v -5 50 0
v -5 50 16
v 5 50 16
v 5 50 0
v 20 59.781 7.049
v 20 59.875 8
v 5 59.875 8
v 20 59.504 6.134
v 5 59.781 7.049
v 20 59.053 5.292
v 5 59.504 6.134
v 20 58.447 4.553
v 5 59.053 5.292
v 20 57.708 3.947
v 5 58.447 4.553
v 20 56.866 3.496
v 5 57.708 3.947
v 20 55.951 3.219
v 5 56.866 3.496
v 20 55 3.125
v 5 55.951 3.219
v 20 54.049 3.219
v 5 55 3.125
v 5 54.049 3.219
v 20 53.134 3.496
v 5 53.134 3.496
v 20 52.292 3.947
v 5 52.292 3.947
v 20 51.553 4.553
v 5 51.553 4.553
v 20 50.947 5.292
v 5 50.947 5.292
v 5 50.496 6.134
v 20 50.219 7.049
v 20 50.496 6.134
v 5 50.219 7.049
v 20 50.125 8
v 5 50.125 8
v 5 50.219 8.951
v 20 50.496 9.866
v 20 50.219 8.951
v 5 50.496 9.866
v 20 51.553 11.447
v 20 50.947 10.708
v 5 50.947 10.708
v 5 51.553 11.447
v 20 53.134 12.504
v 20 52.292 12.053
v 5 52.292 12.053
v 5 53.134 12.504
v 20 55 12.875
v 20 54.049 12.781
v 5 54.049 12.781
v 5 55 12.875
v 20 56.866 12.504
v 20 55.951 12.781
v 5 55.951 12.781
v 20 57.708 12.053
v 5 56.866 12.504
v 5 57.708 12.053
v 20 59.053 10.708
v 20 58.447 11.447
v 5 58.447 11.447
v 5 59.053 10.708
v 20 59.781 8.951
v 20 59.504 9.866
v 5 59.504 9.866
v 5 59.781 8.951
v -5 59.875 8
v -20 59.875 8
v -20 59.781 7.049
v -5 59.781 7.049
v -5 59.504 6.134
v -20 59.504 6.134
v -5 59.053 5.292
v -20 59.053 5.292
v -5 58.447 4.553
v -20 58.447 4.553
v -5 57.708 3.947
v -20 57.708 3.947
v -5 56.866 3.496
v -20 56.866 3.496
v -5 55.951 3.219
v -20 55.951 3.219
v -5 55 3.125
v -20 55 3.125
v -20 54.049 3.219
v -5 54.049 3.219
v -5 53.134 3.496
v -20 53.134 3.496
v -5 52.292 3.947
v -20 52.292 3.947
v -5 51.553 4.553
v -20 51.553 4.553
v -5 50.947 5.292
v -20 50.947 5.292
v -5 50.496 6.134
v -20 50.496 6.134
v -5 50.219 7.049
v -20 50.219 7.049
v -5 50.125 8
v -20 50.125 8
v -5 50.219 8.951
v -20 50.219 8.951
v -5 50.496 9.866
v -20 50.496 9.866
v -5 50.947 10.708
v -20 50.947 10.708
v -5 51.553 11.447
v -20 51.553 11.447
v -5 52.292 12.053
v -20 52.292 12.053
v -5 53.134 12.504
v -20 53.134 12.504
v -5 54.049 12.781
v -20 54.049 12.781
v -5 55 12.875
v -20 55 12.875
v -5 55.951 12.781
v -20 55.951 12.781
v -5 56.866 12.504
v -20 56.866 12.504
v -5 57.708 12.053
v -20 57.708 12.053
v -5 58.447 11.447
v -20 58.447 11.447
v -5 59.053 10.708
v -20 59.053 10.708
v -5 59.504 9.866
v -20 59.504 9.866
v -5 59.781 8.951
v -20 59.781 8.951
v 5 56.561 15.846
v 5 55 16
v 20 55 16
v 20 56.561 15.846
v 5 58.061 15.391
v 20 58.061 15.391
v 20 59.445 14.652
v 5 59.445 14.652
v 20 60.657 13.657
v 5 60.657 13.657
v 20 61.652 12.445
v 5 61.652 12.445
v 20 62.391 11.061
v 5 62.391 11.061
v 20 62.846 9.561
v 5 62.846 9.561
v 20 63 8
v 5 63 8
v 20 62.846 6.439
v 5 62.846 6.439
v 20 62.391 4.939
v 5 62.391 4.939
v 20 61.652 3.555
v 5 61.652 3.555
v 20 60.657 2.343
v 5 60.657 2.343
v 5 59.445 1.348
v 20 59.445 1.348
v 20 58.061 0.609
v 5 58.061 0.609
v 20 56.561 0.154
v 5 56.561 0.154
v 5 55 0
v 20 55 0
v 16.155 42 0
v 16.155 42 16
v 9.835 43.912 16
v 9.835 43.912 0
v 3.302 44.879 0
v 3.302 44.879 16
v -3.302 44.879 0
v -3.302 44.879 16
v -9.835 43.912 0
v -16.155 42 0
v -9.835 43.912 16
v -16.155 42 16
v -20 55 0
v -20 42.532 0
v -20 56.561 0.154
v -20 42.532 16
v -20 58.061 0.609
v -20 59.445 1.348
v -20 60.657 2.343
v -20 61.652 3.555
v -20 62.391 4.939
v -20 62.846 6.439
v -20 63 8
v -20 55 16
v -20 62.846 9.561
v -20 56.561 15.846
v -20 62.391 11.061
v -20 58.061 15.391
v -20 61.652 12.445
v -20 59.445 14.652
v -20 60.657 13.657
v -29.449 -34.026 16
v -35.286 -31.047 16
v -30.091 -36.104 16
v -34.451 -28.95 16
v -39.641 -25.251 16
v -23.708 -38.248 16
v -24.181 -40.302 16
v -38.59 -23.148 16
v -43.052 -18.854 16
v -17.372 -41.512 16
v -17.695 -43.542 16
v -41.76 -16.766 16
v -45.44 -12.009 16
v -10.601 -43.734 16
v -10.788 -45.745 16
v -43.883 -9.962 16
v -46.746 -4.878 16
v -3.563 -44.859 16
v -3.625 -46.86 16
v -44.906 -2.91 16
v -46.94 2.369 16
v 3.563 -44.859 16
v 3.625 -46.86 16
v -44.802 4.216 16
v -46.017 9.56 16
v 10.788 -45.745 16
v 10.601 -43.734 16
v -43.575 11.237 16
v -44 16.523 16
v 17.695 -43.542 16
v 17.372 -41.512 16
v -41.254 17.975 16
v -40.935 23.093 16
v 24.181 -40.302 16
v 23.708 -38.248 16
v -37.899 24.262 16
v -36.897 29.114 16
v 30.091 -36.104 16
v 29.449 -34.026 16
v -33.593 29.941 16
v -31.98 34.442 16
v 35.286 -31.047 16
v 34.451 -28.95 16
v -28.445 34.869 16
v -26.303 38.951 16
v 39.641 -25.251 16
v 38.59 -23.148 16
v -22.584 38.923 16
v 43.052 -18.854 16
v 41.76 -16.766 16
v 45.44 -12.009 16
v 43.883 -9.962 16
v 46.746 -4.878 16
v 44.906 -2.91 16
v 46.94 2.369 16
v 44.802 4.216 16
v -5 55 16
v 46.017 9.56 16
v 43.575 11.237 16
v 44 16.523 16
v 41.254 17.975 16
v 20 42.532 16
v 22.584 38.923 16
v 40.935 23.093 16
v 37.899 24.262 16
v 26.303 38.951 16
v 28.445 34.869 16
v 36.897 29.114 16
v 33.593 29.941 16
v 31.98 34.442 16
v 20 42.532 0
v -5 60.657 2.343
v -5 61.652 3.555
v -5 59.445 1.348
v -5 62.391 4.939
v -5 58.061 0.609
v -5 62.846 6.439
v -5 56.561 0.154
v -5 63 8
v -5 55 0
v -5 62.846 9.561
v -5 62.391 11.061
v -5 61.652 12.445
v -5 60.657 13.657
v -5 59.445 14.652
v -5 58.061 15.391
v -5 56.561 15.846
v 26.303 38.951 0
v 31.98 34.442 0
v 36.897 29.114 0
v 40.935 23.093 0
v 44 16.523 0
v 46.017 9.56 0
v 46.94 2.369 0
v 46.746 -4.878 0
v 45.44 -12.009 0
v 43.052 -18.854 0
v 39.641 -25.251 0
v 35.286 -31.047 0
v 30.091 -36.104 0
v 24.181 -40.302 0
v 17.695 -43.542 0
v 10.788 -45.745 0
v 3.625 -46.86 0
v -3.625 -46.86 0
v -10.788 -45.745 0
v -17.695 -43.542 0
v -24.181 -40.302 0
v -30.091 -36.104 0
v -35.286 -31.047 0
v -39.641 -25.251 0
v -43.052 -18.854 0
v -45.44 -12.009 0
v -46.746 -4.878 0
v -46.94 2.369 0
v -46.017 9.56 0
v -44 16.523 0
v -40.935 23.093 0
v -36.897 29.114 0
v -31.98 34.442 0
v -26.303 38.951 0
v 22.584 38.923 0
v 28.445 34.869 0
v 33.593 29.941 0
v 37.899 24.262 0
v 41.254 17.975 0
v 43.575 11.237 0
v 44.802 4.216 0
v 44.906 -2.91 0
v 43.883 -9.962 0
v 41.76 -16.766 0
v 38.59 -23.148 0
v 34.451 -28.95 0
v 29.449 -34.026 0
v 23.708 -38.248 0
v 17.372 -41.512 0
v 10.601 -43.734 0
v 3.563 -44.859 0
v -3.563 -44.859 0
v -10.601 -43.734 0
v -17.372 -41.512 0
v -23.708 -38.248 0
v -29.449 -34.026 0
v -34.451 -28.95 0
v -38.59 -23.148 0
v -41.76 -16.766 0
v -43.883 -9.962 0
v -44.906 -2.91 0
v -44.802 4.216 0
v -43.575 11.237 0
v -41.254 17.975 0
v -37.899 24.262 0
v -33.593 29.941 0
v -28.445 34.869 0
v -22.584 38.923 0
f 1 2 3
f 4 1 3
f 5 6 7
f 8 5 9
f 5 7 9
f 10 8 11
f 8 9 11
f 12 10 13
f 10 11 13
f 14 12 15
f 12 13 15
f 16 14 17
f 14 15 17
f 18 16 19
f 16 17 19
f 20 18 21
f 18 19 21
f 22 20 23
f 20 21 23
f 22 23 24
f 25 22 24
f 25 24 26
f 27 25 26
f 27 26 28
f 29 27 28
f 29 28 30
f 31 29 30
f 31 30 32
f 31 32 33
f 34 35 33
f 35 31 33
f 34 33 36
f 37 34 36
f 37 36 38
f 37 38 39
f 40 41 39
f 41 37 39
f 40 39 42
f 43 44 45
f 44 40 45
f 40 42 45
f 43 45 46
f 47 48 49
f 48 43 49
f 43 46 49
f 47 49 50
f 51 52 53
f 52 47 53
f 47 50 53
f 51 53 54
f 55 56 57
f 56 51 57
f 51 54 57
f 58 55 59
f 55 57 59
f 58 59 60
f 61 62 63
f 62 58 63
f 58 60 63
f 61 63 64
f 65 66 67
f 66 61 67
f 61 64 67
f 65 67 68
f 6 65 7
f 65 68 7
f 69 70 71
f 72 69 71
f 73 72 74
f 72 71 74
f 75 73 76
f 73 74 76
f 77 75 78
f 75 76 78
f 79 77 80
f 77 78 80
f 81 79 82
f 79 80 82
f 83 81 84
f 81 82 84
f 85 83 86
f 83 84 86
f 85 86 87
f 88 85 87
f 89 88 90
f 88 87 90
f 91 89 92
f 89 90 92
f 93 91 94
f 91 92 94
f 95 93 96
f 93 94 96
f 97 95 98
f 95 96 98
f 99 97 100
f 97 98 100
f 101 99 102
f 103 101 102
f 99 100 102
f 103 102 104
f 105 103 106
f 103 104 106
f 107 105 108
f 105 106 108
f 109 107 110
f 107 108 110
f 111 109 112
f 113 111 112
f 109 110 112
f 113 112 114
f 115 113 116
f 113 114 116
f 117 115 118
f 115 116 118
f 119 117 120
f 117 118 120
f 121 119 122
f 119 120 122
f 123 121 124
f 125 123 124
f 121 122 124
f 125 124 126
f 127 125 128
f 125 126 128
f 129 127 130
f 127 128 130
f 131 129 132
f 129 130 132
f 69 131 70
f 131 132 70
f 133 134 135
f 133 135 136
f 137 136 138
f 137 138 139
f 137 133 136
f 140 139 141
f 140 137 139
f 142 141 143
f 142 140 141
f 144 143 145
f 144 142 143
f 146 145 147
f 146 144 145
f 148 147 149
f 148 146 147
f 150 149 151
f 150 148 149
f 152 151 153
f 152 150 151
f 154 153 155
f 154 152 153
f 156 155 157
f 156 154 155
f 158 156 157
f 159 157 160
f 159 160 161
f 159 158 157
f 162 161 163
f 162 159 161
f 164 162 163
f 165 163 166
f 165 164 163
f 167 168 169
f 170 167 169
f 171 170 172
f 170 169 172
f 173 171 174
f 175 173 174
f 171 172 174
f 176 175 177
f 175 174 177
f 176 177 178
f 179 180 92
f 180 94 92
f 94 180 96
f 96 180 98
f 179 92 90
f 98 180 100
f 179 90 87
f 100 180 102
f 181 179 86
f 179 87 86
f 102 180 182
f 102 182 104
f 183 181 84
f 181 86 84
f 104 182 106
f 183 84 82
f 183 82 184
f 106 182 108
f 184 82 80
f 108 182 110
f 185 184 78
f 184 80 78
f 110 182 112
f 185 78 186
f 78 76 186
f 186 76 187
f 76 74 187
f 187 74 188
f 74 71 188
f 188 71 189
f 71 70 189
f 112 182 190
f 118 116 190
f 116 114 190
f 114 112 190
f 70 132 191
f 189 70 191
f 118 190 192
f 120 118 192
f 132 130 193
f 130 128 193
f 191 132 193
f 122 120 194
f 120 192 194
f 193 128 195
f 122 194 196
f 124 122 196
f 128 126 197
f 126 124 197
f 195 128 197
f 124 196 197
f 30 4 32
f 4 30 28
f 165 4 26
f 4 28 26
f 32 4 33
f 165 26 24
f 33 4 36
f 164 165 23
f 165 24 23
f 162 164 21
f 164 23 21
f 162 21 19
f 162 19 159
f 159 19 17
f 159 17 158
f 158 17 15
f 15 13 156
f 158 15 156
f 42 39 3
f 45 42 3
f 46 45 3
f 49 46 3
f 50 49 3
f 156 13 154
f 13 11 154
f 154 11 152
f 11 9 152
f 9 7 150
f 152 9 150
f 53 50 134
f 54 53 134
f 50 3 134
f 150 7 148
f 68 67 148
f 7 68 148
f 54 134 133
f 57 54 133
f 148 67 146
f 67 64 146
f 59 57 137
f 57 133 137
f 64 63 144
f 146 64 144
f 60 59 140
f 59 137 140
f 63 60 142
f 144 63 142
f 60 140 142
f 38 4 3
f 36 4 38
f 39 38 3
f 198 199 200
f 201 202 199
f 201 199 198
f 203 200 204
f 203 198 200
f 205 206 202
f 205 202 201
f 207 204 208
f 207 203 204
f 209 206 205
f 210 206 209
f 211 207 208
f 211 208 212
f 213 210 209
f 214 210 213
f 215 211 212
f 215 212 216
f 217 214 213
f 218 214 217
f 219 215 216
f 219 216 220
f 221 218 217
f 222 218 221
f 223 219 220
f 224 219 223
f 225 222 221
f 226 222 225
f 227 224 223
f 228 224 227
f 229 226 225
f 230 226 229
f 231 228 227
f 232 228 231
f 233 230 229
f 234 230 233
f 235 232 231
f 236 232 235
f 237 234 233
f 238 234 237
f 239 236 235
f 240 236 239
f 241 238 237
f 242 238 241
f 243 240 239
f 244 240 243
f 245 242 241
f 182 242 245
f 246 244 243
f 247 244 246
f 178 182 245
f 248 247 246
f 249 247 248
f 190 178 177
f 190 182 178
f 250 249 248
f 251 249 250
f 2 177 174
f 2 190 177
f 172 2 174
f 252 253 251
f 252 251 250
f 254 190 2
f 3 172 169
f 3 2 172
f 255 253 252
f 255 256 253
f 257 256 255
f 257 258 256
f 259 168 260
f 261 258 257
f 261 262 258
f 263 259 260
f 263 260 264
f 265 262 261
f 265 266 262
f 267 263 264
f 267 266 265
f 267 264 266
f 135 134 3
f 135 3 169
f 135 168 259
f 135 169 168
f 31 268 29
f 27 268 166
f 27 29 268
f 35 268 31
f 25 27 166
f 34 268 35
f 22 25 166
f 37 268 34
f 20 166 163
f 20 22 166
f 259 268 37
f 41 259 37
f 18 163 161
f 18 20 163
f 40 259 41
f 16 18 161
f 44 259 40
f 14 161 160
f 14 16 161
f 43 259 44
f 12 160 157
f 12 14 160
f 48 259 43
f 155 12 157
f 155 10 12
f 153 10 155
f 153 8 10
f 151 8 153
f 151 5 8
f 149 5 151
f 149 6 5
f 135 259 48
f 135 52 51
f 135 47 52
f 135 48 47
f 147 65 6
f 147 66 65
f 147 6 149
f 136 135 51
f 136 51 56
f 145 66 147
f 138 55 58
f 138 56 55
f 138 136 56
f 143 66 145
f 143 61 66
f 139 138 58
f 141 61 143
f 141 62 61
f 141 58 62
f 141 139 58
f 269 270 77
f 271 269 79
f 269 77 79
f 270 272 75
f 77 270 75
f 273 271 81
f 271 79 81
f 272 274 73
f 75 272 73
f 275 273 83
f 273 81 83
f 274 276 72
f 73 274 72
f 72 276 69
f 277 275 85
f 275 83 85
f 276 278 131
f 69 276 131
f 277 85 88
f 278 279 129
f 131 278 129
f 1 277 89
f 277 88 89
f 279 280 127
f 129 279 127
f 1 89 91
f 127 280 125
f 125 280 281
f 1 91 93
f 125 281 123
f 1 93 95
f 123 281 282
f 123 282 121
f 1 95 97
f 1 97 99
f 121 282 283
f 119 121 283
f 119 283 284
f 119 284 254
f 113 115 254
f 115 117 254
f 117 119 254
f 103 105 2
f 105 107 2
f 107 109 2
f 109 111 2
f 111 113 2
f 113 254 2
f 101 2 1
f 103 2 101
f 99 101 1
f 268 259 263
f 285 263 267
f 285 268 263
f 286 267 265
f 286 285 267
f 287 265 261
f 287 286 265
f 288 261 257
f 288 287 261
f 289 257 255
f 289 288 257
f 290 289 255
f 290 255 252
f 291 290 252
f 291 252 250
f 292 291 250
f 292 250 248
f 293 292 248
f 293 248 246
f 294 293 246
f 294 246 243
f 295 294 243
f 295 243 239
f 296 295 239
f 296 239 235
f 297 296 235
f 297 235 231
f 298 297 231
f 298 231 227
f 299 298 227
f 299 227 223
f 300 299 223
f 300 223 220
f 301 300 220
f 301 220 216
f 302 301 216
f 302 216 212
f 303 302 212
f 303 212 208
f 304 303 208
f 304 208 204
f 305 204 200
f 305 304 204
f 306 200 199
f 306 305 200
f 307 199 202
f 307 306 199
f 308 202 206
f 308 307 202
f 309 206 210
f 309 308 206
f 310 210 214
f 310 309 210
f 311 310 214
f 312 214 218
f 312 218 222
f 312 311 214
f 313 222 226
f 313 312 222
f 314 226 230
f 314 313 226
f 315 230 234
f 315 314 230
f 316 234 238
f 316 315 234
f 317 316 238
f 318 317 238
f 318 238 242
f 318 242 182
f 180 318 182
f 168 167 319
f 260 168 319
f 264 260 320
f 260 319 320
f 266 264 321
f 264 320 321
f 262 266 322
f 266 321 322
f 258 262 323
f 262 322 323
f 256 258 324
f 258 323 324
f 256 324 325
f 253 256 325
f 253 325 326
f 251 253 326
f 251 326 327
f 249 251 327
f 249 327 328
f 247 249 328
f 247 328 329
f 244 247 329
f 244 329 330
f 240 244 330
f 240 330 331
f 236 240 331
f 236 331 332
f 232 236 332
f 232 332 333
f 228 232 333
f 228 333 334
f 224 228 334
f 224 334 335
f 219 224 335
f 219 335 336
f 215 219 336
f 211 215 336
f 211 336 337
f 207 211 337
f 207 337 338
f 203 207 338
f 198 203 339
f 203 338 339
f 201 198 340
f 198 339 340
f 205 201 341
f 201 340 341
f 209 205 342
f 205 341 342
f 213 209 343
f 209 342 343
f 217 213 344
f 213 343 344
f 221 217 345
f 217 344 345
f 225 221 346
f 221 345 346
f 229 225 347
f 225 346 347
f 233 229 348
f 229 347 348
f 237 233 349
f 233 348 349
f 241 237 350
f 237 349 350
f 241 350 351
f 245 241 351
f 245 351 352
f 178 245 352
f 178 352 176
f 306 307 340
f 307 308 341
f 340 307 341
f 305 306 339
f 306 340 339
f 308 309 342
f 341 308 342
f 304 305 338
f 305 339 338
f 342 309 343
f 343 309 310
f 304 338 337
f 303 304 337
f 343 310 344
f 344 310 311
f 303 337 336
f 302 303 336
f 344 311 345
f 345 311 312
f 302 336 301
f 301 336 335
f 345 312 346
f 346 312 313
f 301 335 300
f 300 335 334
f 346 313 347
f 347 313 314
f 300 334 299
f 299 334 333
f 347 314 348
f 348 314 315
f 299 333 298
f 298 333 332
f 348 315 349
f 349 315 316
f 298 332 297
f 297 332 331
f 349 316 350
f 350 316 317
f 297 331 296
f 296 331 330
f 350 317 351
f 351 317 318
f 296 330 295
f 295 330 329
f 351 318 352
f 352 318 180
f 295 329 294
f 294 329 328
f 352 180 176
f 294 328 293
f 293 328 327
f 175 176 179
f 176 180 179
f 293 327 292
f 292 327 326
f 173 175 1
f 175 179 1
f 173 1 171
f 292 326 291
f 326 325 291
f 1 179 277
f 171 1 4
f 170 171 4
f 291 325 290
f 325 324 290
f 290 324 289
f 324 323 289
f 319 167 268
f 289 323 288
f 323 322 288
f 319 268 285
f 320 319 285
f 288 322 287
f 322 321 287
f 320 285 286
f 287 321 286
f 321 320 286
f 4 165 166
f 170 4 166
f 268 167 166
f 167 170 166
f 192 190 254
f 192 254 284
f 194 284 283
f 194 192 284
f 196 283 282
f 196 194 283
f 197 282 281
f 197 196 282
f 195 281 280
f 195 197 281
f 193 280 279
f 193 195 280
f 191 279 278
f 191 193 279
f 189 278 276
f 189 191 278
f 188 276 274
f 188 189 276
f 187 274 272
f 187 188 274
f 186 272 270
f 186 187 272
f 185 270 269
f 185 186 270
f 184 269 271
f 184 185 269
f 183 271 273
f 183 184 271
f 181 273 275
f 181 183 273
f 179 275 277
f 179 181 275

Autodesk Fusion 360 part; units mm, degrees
sketch "Sketch1" plane through (0, 0, 0) normal (0, 0, 1) x (1, 0, 0)
  circle A0 centre (0, 0) radius 45
  circle A1 centre (0, 0) radius 47
  dimension "d1" = 90
  dimension "d3" = 2
extrude "Extrude1" add sketch "Sketch1" along normal blind 16
ref_plane "WorkPlane1" through (55, 0, 0) normal (1, 0, 0) x (0, 1, 0)
sketch "Sketch2" plane through (55, 0, 0) normal (1, 0, 0) x (0, 1, 0)
  circle A0 centre (55, 8) radius 4.875
  circle A1 centre (55, 8) radius 8
  line L0 (47, 16) -> (-47, 16)
  line L1 (47, 0) -> (-47, 0)
  line L2 (47, 16) -> (55, 16)
  line L3 (47, 0) -> (55, 0)
  line L4 (47, 16) -> (42, 16)
  line L5 (42, 16) -> (42, 0)
  line L6 (42, 0) -> (47, 0)
  line L7 (47, 0) -> (47, 16)
  dimension "d7" = 9.75
  dimension "d10" = 5
extrude "Extrude2" add sketch "Sketch2" along normal mid plane 40 from surface at -55
sketch "Sketch3" plane through (0, 0, 16) normal (0, 0, 1) x (-1, 0, 0)
  arc A0 (20, -42.5323) -> (-20, -42.5323) centre (0, 0) ccw
  line L0 (-20, -42.5323) -> (-20, -55)
  line L1 (-20, -55) -> (20, -55)
  line L2 (20, -55) -> (20, -42.5323)
  arc A1 (16.1555, -42) -> (-16.1555, -42) centre (0, 0) ccw
  line L3 (16.1555, -42) -> (-16.1555, -42)
  circle A2 centre (0, 0) radius 45
  line L4 (5, -50) -> (-5, -50)
  line L5 (-5, -50) -> (-5, -65)
  line L6 (-5, -65) -> (5, -65)
  line L7 (5, -65) -> (5, -50)
  dimension "d13" = 5
  dimension "d14" = 5
  dimension "d15" = 50
  dimension "d16" = 15
extrude "Extrude3" cut sketch "Sketch3" against normal through all contours L1 L5 L6 L7 | L1 L4 L5 L7 | A1 L3 A2 | L3 A2
